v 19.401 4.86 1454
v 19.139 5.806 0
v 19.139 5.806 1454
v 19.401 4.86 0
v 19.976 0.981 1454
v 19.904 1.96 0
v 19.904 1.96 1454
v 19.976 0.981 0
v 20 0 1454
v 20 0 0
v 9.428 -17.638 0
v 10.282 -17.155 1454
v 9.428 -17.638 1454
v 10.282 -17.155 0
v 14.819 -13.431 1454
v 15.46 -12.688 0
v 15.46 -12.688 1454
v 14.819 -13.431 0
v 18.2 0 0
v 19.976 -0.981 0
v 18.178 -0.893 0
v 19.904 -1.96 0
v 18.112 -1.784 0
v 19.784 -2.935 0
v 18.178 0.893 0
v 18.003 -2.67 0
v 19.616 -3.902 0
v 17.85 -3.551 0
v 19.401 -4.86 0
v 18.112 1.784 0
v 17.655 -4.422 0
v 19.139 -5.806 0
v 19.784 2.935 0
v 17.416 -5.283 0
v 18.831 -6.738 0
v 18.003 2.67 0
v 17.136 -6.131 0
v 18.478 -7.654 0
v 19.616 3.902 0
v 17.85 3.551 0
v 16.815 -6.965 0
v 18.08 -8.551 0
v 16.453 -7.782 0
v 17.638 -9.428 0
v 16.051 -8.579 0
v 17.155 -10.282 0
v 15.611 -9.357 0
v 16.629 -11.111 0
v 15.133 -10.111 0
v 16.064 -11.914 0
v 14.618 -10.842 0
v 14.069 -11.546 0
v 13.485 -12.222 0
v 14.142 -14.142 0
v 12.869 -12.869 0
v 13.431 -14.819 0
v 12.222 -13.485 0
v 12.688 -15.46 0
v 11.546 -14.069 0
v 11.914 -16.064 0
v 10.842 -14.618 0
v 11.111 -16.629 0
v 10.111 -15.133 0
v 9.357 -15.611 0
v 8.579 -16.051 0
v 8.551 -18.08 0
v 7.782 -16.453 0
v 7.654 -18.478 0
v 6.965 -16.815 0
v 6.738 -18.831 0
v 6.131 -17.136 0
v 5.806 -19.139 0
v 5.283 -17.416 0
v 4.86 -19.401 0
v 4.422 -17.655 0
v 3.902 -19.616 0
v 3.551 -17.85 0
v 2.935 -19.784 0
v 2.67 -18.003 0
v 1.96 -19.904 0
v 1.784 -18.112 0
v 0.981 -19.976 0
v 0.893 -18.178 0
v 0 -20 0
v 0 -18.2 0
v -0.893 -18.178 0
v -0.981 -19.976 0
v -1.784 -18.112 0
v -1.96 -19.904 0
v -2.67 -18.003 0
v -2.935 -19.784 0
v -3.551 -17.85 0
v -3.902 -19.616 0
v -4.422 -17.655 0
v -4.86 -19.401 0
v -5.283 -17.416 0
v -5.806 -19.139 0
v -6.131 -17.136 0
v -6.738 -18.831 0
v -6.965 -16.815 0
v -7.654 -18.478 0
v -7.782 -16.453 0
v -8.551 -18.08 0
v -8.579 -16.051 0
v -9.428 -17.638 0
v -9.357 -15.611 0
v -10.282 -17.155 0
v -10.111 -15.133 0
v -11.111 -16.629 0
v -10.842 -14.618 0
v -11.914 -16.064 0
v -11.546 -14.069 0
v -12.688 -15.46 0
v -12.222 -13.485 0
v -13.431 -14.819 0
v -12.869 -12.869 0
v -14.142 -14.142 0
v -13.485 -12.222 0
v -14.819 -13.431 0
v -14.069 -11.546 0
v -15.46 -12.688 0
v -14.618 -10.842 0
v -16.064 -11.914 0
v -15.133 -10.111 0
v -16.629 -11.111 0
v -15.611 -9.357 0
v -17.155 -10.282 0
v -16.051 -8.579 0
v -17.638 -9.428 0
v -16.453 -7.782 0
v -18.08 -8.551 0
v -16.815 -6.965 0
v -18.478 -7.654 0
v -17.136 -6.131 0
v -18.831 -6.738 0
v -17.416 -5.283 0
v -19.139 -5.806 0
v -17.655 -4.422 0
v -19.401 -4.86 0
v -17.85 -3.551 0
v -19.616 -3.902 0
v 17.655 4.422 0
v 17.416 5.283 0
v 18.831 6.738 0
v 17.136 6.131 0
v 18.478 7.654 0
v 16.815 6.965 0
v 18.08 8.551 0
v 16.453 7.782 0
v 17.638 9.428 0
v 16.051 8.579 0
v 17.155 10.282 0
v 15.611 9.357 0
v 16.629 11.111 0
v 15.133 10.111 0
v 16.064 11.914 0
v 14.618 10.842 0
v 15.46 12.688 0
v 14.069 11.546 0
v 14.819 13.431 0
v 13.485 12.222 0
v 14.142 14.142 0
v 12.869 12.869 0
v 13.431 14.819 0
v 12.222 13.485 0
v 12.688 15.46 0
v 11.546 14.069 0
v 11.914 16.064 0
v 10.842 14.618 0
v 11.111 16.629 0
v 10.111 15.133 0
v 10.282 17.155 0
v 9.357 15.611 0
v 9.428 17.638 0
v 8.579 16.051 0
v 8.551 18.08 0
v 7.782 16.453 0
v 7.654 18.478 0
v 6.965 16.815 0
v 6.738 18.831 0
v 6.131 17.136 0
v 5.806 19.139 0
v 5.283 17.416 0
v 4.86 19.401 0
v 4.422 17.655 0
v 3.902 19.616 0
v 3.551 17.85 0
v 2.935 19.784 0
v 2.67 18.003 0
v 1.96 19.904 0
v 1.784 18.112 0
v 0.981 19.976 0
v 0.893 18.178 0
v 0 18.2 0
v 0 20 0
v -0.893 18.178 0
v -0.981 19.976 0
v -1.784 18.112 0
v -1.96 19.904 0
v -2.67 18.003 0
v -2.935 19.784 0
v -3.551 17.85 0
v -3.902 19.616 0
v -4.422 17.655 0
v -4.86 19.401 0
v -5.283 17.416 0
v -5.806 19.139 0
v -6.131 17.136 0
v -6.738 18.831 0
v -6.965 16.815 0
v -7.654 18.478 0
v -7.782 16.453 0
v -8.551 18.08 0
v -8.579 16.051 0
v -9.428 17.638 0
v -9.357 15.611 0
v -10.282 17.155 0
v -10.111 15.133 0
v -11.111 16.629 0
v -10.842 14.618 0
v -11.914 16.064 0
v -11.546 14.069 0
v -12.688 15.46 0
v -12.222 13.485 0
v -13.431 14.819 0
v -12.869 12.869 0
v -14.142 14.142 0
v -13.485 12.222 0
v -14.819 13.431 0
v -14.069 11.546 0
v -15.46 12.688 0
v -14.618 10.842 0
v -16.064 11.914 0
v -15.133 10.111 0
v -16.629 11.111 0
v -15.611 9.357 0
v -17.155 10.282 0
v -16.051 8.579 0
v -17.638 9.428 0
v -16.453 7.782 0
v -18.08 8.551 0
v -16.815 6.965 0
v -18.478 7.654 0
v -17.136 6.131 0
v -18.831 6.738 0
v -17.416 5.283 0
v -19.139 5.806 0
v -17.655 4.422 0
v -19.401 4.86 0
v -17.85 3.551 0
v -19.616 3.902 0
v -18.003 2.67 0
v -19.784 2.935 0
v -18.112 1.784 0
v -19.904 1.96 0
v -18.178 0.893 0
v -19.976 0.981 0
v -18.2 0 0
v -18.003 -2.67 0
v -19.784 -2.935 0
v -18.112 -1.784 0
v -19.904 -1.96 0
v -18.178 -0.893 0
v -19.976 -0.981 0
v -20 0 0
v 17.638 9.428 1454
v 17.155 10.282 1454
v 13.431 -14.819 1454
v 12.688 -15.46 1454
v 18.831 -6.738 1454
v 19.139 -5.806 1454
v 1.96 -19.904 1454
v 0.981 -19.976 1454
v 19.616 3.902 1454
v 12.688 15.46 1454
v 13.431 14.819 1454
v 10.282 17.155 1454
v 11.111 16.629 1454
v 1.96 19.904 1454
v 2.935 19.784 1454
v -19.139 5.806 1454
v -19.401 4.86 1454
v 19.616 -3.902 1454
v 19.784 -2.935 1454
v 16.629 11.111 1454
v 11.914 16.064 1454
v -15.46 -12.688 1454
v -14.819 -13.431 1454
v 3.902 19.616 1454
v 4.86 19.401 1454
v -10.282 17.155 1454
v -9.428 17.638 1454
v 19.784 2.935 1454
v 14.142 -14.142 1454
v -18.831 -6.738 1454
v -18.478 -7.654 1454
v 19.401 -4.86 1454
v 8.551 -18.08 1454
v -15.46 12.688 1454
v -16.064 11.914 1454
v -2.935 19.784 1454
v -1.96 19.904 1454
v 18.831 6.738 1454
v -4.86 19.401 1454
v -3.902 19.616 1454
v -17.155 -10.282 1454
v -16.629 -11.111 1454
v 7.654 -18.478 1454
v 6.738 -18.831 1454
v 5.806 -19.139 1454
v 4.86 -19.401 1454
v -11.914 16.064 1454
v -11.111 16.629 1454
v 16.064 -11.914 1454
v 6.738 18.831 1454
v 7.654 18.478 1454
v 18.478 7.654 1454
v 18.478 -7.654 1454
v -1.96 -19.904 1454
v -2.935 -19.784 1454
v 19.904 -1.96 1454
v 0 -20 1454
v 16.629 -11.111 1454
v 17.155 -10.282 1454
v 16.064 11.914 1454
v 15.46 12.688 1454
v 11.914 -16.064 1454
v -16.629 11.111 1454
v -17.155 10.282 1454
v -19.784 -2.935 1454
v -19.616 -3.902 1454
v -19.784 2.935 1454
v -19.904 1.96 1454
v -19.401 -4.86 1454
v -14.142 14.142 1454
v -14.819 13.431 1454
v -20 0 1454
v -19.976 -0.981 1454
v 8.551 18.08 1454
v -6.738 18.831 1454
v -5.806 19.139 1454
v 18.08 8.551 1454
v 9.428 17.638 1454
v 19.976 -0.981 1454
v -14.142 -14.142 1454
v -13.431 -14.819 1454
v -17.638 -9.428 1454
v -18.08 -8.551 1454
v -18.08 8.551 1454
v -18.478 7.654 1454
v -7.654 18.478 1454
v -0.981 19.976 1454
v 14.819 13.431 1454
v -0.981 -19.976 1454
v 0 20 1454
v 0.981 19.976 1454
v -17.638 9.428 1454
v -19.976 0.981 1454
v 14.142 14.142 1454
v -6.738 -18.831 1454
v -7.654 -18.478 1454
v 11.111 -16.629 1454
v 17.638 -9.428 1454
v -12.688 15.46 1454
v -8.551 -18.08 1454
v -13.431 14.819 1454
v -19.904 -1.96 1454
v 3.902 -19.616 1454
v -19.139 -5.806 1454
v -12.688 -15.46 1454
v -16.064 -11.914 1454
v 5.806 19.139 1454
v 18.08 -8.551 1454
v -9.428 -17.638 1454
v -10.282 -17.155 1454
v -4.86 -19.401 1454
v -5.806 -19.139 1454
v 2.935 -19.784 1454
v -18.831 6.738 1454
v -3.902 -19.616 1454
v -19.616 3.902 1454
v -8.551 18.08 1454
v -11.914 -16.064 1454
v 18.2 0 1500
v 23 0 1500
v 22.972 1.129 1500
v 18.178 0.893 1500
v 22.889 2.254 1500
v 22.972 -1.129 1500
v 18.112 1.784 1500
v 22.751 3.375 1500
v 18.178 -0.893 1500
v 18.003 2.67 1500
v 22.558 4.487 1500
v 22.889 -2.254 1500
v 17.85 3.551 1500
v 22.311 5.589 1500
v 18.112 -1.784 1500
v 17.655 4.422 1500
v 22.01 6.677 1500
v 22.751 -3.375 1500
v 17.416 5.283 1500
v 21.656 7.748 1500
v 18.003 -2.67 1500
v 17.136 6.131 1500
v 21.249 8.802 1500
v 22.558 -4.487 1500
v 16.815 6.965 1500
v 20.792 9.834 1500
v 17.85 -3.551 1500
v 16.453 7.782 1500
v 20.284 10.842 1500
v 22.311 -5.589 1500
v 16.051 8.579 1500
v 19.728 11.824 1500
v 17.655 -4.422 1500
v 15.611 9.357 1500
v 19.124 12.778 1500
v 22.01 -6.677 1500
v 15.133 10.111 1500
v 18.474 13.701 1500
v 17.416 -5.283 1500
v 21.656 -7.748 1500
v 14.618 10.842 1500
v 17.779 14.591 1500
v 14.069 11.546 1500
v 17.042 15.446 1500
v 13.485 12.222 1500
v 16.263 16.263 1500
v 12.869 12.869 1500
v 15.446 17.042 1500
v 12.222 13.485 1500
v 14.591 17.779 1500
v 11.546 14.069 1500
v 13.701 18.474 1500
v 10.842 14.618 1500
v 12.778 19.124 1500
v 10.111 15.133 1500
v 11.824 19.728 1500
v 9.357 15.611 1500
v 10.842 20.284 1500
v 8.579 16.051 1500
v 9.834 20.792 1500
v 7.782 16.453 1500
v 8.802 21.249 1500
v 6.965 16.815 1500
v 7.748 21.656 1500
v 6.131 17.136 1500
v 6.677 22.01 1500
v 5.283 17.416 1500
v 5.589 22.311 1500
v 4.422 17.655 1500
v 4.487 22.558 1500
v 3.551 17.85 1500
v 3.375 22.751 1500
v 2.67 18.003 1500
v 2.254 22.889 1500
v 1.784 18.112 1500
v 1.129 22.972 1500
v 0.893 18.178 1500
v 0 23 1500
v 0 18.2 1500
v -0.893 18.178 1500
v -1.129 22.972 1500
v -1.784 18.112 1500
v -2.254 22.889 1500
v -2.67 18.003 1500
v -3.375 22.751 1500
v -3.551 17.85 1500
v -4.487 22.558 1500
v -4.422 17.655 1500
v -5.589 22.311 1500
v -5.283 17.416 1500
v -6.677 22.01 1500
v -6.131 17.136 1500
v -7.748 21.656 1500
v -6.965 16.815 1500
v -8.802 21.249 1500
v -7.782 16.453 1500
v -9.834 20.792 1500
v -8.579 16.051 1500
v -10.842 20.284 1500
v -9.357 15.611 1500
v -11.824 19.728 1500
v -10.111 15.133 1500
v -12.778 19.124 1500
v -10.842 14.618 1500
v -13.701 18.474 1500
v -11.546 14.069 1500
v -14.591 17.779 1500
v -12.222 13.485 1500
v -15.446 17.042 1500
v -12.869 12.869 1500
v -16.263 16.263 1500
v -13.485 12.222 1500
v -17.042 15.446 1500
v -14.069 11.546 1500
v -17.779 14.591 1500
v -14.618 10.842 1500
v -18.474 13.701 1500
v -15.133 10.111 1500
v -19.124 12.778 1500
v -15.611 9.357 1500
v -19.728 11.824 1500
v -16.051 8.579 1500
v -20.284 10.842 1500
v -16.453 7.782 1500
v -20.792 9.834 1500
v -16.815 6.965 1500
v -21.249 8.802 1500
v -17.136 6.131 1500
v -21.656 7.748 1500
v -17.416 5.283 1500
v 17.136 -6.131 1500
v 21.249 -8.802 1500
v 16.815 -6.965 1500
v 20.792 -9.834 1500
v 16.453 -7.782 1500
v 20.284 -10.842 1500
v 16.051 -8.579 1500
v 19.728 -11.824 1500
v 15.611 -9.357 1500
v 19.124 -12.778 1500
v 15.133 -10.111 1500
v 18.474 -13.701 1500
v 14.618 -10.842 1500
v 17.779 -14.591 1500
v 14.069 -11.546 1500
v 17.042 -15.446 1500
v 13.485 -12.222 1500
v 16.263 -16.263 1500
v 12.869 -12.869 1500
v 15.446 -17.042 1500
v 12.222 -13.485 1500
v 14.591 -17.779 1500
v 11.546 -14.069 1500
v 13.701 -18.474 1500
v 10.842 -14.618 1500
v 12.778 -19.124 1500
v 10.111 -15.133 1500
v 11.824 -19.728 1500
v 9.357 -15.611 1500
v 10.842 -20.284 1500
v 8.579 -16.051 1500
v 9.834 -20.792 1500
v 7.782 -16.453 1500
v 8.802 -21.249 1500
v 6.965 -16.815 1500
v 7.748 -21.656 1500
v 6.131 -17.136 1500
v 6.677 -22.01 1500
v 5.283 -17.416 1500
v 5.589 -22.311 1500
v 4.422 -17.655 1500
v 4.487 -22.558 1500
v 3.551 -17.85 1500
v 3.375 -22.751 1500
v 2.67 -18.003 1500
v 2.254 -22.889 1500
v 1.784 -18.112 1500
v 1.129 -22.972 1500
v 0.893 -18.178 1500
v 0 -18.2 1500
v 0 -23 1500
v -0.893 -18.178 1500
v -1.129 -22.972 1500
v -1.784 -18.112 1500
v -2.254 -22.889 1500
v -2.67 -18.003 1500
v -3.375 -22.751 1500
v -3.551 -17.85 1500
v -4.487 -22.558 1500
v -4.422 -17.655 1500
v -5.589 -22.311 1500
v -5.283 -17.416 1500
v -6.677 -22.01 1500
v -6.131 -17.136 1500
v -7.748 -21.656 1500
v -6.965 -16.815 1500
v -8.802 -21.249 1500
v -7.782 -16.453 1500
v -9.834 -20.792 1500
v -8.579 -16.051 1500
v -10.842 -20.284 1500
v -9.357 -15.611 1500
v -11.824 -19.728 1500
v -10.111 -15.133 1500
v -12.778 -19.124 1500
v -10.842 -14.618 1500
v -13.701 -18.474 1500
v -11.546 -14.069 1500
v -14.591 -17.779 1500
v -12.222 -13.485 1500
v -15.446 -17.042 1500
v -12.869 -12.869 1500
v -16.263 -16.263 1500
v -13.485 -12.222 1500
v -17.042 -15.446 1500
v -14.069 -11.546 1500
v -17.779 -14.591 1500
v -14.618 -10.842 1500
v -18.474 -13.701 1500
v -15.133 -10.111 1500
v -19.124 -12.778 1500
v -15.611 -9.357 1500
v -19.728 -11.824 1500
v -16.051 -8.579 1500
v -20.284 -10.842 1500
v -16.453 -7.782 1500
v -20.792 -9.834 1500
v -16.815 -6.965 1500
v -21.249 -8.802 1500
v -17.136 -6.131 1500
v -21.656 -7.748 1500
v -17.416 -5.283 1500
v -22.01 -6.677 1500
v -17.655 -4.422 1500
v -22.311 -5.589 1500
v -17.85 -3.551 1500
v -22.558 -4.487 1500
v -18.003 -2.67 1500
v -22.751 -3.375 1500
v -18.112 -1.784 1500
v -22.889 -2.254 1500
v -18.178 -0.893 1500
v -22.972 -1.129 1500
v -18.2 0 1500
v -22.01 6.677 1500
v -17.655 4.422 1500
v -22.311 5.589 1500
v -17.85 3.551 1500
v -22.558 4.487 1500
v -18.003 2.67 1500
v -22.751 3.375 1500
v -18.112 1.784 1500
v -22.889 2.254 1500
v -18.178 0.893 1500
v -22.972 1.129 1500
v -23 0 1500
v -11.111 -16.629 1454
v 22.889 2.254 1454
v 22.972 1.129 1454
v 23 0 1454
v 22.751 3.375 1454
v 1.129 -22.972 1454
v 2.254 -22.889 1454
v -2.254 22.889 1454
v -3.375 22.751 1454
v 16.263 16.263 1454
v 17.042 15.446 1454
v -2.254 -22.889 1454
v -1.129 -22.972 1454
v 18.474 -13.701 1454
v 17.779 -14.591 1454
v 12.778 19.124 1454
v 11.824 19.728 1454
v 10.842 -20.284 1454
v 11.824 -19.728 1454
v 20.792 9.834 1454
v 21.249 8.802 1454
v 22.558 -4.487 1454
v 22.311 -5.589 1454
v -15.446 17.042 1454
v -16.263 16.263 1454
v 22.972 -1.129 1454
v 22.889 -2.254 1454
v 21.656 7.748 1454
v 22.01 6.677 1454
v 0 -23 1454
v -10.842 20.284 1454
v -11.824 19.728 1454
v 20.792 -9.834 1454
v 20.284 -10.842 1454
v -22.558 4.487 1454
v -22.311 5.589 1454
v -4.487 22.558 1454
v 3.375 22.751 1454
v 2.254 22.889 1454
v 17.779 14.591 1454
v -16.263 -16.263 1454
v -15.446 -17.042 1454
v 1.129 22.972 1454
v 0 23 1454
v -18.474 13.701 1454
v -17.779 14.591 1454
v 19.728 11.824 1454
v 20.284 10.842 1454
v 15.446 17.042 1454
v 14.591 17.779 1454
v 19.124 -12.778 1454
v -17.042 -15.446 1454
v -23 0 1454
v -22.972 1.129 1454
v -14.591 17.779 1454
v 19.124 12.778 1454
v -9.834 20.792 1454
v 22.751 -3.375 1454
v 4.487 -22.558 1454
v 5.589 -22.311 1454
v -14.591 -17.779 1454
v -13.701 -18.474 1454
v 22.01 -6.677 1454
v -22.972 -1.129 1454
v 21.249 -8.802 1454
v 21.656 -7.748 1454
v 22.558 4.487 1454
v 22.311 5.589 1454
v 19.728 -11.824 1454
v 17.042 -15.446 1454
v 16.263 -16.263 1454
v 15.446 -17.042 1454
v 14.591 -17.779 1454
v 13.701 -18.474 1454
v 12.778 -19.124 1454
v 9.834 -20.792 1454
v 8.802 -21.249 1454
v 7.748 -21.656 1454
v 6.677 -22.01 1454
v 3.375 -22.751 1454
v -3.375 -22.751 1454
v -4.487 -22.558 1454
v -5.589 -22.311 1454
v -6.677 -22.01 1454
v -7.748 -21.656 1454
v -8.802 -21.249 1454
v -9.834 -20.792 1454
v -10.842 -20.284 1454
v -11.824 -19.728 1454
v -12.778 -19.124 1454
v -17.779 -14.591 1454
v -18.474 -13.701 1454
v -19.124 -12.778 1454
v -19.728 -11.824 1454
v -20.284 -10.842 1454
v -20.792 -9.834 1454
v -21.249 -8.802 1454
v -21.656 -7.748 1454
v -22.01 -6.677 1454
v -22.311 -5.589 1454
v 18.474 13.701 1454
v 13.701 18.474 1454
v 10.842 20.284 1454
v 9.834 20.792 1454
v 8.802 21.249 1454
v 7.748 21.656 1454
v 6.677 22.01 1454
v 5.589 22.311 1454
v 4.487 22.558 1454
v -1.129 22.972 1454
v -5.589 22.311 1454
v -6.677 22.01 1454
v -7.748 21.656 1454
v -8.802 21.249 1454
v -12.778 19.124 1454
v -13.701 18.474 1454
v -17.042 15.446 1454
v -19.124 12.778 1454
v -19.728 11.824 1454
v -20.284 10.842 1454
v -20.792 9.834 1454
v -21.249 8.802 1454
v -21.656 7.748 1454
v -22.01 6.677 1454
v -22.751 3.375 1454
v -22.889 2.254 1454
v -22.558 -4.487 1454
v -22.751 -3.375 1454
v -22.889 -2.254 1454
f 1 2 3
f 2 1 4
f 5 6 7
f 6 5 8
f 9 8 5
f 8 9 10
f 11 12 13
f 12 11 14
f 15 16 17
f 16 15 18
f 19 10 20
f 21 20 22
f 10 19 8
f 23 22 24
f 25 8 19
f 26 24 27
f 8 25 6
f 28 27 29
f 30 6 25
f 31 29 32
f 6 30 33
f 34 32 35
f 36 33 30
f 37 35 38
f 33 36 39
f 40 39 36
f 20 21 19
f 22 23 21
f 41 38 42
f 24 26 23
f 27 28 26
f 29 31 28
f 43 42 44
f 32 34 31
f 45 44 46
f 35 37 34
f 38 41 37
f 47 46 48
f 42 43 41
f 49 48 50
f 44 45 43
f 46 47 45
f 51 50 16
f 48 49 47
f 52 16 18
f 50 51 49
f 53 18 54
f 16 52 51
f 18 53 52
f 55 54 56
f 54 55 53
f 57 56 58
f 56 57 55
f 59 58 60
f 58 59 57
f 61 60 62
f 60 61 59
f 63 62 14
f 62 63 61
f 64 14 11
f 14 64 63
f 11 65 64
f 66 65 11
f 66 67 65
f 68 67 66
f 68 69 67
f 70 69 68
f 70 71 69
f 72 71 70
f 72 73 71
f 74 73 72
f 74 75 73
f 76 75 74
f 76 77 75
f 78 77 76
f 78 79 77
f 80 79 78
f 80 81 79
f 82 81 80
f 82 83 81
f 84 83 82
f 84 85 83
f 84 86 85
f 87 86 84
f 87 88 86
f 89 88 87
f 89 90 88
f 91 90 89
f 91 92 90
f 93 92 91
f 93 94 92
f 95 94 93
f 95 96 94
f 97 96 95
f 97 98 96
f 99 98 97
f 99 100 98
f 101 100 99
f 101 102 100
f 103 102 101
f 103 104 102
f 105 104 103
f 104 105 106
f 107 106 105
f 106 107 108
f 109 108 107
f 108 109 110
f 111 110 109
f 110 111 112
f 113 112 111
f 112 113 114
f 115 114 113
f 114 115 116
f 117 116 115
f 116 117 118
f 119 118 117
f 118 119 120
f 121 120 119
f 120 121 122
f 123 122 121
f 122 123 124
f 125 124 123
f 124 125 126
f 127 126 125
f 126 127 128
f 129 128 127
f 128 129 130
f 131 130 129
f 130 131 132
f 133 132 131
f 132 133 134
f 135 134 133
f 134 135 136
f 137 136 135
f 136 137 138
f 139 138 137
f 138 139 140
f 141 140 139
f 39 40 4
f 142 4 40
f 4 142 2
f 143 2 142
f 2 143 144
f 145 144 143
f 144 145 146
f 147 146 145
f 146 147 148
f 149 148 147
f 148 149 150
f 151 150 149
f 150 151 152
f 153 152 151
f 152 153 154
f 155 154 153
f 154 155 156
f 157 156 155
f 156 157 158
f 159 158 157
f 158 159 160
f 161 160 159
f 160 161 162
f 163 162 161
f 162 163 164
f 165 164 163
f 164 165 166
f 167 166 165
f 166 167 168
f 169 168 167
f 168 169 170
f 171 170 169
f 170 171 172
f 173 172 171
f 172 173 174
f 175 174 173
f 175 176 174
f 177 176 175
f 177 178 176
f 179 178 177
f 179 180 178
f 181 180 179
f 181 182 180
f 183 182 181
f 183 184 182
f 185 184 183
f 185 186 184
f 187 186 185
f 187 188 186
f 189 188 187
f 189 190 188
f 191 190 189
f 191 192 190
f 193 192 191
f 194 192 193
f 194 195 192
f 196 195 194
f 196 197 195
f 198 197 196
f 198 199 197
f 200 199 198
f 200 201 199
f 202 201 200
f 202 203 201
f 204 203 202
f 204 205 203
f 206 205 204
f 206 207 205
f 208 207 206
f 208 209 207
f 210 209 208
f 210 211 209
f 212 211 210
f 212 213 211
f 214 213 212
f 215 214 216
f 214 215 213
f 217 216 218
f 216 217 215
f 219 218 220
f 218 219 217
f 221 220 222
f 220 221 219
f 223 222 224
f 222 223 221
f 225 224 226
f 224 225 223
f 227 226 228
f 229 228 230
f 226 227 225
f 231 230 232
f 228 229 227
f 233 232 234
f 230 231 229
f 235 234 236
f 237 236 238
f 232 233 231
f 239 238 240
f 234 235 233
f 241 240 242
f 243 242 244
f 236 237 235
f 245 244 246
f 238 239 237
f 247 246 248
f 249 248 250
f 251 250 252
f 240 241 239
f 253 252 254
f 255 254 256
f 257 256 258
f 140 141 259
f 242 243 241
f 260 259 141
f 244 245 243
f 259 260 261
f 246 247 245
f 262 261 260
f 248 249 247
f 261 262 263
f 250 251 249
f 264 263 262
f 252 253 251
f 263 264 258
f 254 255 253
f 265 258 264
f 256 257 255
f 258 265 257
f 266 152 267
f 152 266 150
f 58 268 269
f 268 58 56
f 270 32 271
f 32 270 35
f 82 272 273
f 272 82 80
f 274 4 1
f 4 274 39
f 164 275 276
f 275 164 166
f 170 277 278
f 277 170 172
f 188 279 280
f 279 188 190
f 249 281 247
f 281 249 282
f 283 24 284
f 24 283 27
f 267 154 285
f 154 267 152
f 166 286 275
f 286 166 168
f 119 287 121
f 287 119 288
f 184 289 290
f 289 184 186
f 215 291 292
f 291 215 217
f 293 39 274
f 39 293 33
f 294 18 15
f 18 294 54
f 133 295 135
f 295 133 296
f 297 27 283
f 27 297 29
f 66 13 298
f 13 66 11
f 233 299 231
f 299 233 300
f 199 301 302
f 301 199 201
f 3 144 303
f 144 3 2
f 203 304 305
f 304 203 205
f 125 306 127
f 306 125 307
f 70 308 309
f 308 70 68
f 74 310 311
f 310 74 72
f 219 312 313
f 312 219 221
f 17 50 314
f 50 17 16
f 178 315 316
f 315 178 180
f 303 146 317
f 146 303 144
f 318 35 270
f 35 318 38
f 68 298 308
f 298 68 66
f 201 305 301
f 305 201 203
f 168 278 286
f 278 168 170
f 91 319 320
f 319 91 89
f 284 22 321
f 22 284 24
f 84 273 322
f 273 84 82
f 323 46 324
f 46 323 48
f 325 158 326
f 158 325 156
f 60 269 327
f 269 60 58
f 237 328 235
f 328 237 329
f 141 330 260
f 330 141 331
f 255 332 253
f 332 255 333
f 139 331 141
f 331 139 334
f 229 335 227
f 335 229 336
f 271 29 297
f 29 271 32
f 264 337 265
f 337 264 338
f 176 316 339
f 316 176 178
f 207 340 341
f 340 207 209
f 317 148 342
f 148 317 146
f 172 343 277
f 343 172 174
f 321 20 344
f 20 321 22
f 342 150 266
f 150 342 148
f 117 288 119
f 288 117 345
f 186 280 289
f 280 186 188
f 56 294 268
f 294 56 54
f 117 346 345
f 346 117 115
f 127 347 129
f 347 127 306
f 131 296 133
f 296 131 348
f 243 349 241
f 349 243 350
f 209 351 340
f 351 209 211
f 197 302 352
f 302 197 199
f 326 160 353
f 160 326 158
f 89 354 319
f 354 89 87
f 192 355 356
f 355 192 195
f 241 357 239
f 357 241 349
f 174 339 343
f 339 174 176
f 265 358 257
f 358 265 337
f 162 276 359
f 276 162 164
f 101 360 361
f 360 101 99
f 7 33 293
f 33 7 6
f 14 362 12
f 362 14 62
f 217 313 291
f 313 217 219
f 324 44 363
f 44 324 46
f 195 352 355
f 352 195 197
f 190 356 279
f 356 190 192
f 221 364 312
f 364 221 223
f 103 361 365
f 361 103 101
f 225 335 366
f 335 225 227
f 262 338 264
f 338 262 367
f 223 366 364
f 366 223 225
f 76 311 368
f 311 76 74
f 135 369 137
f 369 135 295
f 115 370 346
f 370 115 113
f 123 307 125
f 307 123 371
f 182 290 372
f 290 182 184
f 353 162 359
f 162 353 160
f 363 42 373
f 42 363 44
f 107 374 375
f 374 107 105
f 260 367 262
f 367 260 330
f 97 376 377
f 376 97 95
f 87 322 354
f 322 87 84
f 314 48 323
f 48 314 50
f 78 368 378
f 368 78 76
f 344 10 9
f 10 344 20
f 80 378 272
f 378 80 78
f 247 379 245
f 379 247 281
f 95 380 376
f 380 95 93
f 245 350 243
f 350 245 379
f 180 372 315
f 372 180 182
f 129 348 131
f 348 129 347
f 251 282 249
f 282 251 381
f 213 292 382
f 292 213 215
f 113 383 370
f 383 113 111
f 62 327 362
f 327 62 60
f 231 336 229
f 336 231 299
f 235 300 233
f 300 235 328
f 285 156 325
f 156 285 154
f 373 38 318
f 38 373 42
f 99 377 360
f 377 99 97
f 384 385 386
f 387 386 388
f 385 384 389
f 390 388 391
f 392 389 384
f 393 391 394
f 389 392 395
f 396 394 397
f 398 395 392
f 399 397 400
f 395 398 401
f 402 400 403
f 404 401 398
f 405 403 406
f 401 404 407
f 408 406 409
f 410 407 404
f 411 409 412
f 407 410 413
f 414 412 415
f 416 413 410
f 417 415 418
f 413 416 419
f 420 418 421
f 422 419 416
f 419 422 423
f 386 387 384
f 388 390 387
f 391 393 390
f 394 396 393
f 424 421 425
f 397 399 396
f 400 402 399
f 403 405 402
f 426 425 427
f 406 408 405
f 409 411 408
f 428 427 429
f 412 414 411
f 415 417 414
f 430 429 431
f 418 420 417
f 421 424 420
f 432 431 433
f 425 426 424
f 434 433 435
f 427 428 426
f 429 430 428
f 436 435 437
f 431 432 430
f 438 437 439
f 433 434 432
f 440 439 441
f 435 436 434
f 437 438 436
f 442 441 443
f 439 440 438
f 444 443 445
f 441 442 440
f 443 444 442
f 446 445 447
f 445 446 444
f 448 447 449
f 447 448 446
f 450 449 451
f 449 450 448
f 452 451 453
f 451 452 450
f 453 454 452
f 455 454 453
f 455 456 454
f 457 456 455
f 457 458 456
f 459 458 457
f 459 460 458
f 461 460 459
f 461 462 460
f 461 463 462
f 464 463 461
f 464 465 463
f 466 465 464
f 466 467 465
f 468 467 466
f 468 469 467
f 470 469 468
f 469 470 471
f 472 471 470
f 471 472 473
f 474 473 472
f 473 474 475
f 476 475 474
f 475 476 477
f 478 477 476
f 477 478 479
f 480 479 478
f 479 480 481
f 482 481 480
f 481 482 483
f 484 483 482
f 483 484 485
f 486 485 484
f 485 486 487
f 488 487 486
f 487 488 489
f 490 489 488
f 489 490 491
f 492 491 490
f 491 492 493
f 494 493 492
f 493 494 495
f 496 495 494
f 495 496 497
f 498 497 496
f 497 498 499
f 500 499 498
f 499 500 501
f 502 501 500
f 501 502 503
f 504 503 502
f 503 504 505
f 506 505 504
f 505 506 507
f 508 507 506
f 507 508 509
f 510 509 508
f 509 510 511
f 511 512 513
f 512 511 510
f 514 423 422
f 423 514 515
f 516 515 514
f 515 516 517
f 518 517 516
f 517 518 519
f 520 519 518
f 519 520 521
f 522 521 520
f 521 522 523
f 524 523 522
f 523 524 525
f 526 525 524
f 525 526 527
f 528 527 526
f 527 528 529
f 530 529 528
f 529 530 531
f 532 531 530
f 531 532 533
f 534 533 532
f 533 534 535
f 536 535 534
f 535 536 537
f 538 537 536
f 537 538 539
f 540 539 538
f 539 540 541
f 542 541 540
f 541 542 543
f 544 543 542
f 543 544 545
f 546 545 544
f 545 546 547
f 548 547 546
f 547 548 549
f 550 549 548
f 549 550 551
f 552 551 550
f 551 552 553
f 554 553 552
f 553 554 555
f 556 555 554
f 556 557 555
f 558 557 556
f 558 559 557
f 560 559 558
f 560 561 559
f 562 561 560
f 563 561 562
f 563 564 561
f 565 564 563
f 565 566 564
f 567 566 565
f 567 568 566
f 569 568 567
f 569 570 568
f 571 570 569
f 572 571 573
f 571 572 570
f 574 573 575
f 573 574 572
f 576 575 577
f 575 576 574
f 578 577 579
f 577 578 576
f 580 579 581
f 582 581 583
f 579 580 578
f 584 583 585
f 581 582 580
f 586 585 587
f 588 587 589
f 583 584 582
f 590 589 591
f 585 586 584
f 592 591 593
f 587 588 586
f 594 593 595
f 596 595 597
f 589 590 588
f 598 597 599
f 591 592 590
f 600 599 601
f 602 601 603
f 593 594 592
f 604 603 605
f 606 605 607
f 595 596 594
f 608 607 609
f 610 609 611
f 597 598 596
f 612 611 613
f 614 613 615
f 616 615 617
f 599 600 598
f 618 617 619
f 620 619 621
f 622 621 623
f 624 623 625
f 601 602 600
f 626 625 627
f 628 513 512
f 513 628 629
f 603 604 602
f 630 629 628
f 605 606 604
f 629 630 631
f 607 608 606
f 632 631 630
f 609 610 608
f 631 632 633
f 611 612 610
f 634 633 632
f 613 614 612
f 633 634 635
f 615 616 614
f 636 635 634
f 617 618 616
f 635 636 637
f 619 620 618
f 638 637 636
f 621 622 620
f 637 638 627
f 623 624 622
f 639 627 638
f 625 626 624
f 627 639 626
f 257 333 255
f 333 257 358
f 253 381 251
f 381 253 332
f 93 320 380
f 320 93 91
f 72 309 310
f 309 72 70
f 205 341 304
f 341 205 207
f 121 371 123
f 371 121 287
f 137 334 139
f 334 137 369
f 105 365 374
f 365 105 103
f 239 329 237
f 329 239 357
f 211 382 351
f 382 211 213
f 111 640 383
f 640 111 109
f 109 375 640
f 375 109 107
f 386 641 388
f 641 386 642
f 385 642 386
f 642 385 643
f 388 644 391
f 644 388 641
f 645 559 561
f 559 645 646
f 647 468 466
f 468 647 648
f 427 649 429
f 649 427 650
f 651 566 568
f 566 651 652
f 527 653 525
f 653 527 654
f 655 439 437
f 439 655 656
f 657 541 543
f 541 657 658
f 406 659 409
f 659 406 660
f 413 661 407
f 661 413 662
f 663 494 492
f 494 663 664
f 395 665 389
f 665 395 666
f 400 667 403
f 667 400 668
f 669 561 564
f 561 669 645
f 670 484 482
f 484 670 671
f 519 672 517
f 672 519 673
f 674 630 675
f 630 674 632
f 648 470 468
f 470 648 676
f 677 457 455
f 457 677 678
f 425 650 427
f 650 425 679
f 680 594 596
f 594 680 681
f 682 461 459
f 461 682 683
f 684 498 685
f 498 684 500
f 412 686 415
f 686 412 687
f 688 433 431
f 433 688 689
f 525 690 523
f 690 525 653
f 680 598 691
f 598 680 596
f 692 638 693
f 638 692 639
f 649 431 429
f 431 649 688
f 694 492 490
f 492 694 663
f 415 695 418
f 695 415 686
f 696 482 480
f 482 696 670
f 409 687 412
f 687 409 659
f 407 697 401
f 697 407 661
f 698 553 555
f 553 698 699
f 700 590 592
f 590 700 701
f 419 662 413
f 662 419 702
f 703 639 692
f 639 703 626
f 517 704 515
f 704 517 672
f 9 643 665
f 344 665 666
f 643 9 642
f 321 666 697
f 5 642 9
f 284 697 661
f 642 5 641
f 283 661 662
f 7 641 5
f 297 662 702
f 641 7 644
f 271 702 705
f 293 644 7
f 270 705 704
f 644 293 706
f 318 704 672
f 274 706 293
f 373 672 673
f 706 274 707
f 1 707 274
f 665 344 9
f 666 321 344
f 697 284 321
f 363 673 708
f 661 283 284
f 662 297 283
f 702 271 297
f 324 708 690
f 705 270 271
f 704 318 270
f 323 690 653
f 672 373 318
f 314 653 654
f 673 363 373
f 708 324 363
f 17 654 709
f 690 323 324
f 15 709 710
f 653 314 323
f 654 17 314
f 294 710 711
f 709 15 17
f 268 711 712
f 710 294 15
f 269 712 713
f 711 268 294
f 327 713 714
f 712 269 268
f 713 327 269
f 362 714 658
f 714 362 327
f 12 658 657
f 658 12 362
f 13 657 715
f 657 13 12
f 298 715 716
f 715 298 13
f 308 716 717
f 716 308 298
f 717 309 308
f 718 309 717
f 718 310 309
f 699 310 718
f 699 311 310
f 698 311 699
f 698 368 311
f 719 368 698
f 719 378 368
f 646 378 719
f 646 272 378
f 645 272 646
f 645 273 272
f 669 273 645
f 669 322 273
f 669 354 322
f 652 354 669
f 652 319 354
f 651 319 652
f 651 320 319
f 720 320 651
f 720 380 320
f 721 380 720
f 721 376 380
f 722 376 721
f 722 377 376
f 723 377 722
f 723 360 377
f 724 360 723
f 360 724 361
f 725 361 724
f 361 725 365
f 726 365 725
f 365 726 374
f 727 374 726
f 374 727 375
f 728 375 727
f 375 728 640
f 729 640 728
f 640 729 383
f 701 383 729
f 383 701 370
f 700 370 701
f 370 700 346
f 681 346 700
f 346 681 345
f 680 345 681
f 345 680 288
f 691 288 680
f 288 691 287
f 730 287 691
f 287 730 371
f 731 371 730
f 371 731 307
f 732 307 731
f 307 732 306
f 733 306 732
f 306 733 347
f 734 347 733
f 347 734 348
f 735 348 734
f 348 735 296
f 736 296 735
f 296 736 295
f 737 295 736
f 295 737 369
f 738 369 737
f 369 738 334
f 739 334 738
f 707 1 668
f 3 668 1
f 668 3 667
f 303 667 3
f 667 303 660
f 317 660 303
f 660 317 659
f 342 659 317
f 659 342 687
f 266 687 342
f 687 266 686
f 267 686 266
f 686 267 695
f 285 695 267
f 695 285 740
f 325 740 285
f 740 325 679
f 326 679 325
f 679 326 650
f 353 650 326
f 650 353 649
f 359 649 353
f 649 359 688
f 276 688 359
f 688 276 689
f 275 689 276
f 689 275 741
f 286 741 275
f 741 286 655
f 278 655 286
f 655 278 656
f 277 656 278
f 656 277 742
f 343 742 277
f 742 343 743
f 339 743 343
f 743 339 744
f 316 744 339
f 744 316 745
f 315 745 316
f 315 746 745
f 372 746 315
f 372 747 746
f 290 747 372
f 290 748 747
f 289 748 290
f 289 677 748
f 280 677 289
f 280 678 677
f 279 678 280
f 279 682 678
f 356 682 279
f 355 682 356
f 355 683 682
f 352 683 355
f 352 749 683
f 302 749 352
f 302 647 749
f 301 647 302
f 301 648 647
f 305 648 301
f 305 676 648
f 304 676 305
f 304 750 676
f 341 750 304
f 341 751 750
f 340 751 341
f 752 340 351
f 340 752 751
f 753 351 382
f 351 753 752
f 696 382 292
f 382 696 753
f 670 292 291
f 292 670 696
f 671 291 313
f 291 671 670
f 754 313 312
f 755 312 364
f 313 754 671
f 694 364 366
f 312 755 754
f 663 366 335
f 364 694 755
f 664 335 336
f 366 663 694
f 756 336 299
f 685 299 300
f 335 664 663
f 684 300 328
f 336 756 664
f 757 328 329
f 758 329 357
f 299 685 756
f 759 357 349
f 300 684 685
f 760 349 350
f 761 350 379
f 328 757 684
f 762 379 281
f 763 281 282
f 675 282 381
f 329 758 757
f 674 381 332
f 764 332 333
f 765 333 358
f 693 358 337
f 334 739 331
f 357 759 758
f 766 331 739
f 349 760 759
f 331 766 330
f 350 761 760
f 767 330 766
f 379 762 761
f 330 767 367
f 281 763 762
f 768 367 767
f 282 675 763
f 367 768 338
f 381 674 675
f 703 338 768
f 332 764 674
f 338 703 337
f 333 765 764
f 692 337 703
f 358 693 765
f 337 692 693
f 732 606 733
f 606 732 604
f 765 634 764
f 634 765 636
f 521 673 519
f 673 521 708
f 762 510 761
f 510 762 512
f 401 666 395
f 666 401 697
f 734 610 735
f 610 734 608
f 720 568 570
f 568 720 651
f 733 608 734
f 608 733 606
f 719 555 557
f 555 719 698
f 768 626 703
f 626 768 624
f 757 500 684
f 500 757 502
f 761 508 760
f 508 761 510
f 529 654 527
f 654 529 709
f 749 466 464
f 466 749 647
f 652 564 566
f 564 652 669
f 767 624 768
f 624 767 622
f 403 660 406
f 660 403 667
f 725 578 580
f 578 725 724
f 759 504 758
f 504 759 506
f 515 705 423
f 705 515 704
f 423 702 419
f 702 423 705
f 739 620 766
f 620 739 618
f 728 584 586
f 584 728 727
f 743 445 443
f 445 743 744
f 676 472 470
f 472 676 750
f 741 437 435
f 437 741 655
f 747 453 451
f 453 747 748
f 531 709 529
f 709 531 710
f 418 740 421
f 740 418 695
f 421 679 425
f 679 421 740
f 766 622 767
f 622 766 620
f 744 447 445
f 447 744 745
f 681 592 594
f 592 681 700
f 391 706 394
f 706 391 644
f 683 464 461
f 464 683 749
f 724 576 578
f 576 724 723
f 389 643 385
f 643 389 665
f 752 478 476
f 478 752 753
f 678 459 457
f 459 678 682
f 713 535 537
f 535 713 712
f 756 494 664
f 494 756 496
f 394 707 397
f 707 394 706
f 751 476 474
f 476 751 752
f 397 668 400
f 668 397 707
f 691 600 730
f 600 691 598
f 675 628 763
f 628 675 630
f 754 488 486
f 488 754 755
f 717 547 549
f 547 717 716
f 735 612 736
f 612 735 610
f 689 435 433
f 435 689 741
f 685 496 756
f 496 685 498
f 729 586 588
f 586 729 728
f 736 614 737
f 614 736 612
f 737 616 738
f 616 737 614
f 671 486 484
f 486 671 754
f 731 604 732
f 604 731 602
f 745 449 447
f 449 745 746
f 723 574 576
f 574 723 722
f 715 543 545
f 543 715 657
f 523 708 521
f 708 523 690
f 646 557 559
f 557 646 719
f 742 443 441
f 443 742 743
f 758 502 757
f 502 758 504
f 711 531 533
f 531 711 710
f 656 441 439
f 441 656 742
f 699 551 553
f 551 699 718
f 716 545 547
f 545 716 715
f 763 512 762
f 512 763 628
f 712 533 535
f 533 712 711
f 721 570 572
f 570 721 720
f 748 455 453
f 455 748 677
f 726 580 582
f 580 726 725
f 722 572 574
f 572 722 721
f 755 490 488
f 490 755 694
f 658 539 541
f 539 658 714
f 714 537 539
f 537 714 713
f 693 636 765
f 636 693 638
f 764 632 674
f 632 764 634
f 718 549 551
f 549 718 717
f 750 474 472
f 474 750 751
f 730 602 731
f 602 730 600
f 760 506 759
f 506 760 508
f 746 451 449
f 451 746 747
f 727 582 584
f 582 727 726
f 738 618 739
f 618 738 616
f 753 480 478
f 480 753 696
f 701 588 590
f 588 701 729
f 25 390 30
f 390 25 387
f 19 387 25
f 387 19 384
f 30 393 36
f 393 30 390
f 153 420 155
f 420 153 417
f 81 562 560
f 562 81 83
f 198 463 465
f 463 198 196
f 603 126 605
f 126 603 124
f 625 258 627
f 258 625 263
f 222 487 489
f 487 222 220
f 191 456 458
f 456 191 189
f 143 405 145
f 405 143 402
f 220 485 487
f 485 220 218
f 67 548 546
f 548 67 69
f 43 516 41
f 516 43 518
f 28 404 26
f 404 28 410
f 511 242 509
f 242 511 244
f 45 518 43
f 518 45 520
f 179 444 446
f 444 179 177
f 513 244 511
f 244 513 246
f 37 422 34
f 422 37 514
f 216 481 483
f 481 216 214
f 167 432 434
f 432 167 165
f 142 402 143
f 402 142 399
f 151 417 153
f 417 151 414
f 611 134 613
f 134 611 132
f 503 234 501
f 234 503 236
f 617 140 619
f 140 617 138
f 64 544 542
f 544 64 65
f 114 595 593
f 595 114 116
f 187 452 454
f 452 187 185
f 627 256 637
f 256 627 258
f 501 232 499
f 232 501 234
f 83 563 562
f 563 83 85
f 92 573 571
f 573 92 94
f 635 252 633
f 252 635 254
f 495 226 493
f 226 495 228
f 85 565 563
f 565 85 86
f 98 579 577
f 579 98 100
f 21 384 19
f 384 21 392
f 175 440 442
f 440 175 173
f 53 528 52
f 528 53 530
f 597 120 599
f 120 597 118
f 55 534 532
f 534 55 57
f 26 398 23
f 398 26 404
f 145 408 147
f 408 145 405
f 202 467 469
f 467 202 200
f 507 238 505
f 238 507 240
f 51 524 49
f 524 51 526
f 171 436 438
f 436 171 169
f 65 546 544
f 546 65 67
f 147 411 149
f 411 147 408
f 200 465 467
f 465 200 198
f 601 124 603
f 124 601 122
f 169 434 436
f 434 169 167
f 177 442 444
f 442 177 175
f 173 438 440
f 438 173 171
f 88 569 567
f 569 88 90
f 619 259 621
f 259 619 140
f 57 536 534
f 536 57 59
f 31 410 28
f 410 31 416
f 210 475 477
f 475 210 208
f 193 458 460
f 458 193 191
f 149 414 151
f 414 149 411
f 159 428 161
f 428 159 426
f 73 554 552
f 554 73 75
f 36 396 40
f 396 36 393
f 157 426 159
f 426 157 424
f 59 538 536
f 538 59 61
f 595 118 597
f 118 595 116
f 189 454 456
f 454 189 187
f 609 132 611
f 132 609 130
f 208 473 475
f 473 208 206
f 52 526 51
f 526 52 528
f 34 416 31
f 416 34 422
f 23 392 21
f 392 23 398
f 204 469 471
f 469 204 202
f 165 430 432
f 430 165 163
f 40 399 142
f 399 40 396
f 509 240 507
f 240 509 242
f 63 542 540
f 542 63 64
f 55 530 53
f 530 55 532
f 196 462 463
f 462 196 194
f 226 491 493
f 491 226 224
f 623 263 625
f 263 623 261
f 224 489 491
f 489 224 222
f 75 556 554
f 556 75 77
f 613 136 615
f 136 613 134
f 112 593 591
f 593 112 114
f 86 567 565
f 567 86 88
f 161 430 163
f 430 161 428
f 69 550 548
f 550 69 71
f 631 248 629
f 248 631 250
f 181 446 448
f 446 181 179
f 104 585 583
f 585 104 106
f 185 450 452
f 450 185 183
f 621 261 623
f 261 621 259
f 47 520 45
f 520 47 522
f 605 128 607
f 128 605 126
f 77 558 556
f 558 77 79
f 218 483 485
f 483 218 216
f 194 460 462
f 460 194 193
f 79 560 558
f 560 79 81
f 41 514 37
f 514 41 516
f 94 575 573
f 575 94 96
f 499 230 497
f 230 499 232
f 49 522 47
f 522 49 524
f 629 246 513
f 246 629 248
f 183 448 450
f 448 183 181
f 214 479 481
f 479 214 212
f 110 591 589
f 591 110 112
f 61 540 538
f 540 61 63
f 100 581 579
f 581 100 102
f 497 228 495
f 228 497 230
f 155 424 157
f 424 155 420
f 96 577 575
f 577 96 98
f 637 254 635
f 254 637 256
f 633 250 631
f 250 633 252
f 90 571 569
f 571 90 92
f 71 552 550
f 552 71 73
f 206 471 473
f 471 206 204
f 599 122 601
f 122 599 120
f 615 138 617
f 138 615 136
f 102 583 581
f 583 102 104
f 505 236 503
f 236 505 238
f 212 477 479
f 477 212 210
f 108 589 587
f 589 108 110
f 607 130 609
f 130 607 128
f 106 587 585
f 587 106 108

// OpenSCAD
// HT 40 pipe 1500 mm (single connected solid)

// Parameters
length_mm = 1500; //[750:3000:10]
ht40_outer_diameter = 40; //[30:80:1]
ht40_wall_thickness = 1.8; //[1:4:0.1]
include_end_fitting = 1; //[0:1:1]
fitting_length = 45; //[20:90:1]
fitting_outer_diameter = 46; //[40:90:1]
fitting_wall_extra = 1.2; //[0.5:4:0.1]
overlap = 1; //[0.5:2:0.1]

$fn = 128;

// Derived radii (guard against invalid values)
outer_r = ht40_outer_diameter/2;
inner_r = max(0.01, outer_r - ht40_wall_thickness);

fitting_outer_r = fitting_outer_diameter/2;
fitting_inner_r = max(0.01, inner_r - fitting_wall_extra);

// HT Pipe Segment - Complete Geometry
module ht_pipe() {
  color([0.85, 0.85, 0.8])  // PVC color
  difference() {
    // OUTER solid (pipe + optional socket), unioned so it's one connected body
    union() {
      // Main pipe outer
      cylinder(h=length_mm, r=outer_r, center=false);

      // End fitting outer (socket collar), connected with overlap
      if (include_end_fitting)
        translate([0, 0, length_mm - fitting_length - overlap])
          cylinder(h=fitting_length + overlap, r=fitting_outer_r, center=false);
    }

    // INNER void (continuous through pipe and into socket)
    union() {
      // Main pipe inner
      translate([0, 0, -overlap])
        cylinder(h=length_mm + 2*overlap, r=inner_r, center=false);

      // Socket inner (slightly larger void region), aligned and overlapping
      if (include_end_fitting)
        translate([0, 0, length_mm - fitting_length - 2*overlap])
          cylinder(h=fitting_length + 4*overlap, r=fitting_inner_r, center=false);
    }
  }
}

// Assembly
ht_pipe();
